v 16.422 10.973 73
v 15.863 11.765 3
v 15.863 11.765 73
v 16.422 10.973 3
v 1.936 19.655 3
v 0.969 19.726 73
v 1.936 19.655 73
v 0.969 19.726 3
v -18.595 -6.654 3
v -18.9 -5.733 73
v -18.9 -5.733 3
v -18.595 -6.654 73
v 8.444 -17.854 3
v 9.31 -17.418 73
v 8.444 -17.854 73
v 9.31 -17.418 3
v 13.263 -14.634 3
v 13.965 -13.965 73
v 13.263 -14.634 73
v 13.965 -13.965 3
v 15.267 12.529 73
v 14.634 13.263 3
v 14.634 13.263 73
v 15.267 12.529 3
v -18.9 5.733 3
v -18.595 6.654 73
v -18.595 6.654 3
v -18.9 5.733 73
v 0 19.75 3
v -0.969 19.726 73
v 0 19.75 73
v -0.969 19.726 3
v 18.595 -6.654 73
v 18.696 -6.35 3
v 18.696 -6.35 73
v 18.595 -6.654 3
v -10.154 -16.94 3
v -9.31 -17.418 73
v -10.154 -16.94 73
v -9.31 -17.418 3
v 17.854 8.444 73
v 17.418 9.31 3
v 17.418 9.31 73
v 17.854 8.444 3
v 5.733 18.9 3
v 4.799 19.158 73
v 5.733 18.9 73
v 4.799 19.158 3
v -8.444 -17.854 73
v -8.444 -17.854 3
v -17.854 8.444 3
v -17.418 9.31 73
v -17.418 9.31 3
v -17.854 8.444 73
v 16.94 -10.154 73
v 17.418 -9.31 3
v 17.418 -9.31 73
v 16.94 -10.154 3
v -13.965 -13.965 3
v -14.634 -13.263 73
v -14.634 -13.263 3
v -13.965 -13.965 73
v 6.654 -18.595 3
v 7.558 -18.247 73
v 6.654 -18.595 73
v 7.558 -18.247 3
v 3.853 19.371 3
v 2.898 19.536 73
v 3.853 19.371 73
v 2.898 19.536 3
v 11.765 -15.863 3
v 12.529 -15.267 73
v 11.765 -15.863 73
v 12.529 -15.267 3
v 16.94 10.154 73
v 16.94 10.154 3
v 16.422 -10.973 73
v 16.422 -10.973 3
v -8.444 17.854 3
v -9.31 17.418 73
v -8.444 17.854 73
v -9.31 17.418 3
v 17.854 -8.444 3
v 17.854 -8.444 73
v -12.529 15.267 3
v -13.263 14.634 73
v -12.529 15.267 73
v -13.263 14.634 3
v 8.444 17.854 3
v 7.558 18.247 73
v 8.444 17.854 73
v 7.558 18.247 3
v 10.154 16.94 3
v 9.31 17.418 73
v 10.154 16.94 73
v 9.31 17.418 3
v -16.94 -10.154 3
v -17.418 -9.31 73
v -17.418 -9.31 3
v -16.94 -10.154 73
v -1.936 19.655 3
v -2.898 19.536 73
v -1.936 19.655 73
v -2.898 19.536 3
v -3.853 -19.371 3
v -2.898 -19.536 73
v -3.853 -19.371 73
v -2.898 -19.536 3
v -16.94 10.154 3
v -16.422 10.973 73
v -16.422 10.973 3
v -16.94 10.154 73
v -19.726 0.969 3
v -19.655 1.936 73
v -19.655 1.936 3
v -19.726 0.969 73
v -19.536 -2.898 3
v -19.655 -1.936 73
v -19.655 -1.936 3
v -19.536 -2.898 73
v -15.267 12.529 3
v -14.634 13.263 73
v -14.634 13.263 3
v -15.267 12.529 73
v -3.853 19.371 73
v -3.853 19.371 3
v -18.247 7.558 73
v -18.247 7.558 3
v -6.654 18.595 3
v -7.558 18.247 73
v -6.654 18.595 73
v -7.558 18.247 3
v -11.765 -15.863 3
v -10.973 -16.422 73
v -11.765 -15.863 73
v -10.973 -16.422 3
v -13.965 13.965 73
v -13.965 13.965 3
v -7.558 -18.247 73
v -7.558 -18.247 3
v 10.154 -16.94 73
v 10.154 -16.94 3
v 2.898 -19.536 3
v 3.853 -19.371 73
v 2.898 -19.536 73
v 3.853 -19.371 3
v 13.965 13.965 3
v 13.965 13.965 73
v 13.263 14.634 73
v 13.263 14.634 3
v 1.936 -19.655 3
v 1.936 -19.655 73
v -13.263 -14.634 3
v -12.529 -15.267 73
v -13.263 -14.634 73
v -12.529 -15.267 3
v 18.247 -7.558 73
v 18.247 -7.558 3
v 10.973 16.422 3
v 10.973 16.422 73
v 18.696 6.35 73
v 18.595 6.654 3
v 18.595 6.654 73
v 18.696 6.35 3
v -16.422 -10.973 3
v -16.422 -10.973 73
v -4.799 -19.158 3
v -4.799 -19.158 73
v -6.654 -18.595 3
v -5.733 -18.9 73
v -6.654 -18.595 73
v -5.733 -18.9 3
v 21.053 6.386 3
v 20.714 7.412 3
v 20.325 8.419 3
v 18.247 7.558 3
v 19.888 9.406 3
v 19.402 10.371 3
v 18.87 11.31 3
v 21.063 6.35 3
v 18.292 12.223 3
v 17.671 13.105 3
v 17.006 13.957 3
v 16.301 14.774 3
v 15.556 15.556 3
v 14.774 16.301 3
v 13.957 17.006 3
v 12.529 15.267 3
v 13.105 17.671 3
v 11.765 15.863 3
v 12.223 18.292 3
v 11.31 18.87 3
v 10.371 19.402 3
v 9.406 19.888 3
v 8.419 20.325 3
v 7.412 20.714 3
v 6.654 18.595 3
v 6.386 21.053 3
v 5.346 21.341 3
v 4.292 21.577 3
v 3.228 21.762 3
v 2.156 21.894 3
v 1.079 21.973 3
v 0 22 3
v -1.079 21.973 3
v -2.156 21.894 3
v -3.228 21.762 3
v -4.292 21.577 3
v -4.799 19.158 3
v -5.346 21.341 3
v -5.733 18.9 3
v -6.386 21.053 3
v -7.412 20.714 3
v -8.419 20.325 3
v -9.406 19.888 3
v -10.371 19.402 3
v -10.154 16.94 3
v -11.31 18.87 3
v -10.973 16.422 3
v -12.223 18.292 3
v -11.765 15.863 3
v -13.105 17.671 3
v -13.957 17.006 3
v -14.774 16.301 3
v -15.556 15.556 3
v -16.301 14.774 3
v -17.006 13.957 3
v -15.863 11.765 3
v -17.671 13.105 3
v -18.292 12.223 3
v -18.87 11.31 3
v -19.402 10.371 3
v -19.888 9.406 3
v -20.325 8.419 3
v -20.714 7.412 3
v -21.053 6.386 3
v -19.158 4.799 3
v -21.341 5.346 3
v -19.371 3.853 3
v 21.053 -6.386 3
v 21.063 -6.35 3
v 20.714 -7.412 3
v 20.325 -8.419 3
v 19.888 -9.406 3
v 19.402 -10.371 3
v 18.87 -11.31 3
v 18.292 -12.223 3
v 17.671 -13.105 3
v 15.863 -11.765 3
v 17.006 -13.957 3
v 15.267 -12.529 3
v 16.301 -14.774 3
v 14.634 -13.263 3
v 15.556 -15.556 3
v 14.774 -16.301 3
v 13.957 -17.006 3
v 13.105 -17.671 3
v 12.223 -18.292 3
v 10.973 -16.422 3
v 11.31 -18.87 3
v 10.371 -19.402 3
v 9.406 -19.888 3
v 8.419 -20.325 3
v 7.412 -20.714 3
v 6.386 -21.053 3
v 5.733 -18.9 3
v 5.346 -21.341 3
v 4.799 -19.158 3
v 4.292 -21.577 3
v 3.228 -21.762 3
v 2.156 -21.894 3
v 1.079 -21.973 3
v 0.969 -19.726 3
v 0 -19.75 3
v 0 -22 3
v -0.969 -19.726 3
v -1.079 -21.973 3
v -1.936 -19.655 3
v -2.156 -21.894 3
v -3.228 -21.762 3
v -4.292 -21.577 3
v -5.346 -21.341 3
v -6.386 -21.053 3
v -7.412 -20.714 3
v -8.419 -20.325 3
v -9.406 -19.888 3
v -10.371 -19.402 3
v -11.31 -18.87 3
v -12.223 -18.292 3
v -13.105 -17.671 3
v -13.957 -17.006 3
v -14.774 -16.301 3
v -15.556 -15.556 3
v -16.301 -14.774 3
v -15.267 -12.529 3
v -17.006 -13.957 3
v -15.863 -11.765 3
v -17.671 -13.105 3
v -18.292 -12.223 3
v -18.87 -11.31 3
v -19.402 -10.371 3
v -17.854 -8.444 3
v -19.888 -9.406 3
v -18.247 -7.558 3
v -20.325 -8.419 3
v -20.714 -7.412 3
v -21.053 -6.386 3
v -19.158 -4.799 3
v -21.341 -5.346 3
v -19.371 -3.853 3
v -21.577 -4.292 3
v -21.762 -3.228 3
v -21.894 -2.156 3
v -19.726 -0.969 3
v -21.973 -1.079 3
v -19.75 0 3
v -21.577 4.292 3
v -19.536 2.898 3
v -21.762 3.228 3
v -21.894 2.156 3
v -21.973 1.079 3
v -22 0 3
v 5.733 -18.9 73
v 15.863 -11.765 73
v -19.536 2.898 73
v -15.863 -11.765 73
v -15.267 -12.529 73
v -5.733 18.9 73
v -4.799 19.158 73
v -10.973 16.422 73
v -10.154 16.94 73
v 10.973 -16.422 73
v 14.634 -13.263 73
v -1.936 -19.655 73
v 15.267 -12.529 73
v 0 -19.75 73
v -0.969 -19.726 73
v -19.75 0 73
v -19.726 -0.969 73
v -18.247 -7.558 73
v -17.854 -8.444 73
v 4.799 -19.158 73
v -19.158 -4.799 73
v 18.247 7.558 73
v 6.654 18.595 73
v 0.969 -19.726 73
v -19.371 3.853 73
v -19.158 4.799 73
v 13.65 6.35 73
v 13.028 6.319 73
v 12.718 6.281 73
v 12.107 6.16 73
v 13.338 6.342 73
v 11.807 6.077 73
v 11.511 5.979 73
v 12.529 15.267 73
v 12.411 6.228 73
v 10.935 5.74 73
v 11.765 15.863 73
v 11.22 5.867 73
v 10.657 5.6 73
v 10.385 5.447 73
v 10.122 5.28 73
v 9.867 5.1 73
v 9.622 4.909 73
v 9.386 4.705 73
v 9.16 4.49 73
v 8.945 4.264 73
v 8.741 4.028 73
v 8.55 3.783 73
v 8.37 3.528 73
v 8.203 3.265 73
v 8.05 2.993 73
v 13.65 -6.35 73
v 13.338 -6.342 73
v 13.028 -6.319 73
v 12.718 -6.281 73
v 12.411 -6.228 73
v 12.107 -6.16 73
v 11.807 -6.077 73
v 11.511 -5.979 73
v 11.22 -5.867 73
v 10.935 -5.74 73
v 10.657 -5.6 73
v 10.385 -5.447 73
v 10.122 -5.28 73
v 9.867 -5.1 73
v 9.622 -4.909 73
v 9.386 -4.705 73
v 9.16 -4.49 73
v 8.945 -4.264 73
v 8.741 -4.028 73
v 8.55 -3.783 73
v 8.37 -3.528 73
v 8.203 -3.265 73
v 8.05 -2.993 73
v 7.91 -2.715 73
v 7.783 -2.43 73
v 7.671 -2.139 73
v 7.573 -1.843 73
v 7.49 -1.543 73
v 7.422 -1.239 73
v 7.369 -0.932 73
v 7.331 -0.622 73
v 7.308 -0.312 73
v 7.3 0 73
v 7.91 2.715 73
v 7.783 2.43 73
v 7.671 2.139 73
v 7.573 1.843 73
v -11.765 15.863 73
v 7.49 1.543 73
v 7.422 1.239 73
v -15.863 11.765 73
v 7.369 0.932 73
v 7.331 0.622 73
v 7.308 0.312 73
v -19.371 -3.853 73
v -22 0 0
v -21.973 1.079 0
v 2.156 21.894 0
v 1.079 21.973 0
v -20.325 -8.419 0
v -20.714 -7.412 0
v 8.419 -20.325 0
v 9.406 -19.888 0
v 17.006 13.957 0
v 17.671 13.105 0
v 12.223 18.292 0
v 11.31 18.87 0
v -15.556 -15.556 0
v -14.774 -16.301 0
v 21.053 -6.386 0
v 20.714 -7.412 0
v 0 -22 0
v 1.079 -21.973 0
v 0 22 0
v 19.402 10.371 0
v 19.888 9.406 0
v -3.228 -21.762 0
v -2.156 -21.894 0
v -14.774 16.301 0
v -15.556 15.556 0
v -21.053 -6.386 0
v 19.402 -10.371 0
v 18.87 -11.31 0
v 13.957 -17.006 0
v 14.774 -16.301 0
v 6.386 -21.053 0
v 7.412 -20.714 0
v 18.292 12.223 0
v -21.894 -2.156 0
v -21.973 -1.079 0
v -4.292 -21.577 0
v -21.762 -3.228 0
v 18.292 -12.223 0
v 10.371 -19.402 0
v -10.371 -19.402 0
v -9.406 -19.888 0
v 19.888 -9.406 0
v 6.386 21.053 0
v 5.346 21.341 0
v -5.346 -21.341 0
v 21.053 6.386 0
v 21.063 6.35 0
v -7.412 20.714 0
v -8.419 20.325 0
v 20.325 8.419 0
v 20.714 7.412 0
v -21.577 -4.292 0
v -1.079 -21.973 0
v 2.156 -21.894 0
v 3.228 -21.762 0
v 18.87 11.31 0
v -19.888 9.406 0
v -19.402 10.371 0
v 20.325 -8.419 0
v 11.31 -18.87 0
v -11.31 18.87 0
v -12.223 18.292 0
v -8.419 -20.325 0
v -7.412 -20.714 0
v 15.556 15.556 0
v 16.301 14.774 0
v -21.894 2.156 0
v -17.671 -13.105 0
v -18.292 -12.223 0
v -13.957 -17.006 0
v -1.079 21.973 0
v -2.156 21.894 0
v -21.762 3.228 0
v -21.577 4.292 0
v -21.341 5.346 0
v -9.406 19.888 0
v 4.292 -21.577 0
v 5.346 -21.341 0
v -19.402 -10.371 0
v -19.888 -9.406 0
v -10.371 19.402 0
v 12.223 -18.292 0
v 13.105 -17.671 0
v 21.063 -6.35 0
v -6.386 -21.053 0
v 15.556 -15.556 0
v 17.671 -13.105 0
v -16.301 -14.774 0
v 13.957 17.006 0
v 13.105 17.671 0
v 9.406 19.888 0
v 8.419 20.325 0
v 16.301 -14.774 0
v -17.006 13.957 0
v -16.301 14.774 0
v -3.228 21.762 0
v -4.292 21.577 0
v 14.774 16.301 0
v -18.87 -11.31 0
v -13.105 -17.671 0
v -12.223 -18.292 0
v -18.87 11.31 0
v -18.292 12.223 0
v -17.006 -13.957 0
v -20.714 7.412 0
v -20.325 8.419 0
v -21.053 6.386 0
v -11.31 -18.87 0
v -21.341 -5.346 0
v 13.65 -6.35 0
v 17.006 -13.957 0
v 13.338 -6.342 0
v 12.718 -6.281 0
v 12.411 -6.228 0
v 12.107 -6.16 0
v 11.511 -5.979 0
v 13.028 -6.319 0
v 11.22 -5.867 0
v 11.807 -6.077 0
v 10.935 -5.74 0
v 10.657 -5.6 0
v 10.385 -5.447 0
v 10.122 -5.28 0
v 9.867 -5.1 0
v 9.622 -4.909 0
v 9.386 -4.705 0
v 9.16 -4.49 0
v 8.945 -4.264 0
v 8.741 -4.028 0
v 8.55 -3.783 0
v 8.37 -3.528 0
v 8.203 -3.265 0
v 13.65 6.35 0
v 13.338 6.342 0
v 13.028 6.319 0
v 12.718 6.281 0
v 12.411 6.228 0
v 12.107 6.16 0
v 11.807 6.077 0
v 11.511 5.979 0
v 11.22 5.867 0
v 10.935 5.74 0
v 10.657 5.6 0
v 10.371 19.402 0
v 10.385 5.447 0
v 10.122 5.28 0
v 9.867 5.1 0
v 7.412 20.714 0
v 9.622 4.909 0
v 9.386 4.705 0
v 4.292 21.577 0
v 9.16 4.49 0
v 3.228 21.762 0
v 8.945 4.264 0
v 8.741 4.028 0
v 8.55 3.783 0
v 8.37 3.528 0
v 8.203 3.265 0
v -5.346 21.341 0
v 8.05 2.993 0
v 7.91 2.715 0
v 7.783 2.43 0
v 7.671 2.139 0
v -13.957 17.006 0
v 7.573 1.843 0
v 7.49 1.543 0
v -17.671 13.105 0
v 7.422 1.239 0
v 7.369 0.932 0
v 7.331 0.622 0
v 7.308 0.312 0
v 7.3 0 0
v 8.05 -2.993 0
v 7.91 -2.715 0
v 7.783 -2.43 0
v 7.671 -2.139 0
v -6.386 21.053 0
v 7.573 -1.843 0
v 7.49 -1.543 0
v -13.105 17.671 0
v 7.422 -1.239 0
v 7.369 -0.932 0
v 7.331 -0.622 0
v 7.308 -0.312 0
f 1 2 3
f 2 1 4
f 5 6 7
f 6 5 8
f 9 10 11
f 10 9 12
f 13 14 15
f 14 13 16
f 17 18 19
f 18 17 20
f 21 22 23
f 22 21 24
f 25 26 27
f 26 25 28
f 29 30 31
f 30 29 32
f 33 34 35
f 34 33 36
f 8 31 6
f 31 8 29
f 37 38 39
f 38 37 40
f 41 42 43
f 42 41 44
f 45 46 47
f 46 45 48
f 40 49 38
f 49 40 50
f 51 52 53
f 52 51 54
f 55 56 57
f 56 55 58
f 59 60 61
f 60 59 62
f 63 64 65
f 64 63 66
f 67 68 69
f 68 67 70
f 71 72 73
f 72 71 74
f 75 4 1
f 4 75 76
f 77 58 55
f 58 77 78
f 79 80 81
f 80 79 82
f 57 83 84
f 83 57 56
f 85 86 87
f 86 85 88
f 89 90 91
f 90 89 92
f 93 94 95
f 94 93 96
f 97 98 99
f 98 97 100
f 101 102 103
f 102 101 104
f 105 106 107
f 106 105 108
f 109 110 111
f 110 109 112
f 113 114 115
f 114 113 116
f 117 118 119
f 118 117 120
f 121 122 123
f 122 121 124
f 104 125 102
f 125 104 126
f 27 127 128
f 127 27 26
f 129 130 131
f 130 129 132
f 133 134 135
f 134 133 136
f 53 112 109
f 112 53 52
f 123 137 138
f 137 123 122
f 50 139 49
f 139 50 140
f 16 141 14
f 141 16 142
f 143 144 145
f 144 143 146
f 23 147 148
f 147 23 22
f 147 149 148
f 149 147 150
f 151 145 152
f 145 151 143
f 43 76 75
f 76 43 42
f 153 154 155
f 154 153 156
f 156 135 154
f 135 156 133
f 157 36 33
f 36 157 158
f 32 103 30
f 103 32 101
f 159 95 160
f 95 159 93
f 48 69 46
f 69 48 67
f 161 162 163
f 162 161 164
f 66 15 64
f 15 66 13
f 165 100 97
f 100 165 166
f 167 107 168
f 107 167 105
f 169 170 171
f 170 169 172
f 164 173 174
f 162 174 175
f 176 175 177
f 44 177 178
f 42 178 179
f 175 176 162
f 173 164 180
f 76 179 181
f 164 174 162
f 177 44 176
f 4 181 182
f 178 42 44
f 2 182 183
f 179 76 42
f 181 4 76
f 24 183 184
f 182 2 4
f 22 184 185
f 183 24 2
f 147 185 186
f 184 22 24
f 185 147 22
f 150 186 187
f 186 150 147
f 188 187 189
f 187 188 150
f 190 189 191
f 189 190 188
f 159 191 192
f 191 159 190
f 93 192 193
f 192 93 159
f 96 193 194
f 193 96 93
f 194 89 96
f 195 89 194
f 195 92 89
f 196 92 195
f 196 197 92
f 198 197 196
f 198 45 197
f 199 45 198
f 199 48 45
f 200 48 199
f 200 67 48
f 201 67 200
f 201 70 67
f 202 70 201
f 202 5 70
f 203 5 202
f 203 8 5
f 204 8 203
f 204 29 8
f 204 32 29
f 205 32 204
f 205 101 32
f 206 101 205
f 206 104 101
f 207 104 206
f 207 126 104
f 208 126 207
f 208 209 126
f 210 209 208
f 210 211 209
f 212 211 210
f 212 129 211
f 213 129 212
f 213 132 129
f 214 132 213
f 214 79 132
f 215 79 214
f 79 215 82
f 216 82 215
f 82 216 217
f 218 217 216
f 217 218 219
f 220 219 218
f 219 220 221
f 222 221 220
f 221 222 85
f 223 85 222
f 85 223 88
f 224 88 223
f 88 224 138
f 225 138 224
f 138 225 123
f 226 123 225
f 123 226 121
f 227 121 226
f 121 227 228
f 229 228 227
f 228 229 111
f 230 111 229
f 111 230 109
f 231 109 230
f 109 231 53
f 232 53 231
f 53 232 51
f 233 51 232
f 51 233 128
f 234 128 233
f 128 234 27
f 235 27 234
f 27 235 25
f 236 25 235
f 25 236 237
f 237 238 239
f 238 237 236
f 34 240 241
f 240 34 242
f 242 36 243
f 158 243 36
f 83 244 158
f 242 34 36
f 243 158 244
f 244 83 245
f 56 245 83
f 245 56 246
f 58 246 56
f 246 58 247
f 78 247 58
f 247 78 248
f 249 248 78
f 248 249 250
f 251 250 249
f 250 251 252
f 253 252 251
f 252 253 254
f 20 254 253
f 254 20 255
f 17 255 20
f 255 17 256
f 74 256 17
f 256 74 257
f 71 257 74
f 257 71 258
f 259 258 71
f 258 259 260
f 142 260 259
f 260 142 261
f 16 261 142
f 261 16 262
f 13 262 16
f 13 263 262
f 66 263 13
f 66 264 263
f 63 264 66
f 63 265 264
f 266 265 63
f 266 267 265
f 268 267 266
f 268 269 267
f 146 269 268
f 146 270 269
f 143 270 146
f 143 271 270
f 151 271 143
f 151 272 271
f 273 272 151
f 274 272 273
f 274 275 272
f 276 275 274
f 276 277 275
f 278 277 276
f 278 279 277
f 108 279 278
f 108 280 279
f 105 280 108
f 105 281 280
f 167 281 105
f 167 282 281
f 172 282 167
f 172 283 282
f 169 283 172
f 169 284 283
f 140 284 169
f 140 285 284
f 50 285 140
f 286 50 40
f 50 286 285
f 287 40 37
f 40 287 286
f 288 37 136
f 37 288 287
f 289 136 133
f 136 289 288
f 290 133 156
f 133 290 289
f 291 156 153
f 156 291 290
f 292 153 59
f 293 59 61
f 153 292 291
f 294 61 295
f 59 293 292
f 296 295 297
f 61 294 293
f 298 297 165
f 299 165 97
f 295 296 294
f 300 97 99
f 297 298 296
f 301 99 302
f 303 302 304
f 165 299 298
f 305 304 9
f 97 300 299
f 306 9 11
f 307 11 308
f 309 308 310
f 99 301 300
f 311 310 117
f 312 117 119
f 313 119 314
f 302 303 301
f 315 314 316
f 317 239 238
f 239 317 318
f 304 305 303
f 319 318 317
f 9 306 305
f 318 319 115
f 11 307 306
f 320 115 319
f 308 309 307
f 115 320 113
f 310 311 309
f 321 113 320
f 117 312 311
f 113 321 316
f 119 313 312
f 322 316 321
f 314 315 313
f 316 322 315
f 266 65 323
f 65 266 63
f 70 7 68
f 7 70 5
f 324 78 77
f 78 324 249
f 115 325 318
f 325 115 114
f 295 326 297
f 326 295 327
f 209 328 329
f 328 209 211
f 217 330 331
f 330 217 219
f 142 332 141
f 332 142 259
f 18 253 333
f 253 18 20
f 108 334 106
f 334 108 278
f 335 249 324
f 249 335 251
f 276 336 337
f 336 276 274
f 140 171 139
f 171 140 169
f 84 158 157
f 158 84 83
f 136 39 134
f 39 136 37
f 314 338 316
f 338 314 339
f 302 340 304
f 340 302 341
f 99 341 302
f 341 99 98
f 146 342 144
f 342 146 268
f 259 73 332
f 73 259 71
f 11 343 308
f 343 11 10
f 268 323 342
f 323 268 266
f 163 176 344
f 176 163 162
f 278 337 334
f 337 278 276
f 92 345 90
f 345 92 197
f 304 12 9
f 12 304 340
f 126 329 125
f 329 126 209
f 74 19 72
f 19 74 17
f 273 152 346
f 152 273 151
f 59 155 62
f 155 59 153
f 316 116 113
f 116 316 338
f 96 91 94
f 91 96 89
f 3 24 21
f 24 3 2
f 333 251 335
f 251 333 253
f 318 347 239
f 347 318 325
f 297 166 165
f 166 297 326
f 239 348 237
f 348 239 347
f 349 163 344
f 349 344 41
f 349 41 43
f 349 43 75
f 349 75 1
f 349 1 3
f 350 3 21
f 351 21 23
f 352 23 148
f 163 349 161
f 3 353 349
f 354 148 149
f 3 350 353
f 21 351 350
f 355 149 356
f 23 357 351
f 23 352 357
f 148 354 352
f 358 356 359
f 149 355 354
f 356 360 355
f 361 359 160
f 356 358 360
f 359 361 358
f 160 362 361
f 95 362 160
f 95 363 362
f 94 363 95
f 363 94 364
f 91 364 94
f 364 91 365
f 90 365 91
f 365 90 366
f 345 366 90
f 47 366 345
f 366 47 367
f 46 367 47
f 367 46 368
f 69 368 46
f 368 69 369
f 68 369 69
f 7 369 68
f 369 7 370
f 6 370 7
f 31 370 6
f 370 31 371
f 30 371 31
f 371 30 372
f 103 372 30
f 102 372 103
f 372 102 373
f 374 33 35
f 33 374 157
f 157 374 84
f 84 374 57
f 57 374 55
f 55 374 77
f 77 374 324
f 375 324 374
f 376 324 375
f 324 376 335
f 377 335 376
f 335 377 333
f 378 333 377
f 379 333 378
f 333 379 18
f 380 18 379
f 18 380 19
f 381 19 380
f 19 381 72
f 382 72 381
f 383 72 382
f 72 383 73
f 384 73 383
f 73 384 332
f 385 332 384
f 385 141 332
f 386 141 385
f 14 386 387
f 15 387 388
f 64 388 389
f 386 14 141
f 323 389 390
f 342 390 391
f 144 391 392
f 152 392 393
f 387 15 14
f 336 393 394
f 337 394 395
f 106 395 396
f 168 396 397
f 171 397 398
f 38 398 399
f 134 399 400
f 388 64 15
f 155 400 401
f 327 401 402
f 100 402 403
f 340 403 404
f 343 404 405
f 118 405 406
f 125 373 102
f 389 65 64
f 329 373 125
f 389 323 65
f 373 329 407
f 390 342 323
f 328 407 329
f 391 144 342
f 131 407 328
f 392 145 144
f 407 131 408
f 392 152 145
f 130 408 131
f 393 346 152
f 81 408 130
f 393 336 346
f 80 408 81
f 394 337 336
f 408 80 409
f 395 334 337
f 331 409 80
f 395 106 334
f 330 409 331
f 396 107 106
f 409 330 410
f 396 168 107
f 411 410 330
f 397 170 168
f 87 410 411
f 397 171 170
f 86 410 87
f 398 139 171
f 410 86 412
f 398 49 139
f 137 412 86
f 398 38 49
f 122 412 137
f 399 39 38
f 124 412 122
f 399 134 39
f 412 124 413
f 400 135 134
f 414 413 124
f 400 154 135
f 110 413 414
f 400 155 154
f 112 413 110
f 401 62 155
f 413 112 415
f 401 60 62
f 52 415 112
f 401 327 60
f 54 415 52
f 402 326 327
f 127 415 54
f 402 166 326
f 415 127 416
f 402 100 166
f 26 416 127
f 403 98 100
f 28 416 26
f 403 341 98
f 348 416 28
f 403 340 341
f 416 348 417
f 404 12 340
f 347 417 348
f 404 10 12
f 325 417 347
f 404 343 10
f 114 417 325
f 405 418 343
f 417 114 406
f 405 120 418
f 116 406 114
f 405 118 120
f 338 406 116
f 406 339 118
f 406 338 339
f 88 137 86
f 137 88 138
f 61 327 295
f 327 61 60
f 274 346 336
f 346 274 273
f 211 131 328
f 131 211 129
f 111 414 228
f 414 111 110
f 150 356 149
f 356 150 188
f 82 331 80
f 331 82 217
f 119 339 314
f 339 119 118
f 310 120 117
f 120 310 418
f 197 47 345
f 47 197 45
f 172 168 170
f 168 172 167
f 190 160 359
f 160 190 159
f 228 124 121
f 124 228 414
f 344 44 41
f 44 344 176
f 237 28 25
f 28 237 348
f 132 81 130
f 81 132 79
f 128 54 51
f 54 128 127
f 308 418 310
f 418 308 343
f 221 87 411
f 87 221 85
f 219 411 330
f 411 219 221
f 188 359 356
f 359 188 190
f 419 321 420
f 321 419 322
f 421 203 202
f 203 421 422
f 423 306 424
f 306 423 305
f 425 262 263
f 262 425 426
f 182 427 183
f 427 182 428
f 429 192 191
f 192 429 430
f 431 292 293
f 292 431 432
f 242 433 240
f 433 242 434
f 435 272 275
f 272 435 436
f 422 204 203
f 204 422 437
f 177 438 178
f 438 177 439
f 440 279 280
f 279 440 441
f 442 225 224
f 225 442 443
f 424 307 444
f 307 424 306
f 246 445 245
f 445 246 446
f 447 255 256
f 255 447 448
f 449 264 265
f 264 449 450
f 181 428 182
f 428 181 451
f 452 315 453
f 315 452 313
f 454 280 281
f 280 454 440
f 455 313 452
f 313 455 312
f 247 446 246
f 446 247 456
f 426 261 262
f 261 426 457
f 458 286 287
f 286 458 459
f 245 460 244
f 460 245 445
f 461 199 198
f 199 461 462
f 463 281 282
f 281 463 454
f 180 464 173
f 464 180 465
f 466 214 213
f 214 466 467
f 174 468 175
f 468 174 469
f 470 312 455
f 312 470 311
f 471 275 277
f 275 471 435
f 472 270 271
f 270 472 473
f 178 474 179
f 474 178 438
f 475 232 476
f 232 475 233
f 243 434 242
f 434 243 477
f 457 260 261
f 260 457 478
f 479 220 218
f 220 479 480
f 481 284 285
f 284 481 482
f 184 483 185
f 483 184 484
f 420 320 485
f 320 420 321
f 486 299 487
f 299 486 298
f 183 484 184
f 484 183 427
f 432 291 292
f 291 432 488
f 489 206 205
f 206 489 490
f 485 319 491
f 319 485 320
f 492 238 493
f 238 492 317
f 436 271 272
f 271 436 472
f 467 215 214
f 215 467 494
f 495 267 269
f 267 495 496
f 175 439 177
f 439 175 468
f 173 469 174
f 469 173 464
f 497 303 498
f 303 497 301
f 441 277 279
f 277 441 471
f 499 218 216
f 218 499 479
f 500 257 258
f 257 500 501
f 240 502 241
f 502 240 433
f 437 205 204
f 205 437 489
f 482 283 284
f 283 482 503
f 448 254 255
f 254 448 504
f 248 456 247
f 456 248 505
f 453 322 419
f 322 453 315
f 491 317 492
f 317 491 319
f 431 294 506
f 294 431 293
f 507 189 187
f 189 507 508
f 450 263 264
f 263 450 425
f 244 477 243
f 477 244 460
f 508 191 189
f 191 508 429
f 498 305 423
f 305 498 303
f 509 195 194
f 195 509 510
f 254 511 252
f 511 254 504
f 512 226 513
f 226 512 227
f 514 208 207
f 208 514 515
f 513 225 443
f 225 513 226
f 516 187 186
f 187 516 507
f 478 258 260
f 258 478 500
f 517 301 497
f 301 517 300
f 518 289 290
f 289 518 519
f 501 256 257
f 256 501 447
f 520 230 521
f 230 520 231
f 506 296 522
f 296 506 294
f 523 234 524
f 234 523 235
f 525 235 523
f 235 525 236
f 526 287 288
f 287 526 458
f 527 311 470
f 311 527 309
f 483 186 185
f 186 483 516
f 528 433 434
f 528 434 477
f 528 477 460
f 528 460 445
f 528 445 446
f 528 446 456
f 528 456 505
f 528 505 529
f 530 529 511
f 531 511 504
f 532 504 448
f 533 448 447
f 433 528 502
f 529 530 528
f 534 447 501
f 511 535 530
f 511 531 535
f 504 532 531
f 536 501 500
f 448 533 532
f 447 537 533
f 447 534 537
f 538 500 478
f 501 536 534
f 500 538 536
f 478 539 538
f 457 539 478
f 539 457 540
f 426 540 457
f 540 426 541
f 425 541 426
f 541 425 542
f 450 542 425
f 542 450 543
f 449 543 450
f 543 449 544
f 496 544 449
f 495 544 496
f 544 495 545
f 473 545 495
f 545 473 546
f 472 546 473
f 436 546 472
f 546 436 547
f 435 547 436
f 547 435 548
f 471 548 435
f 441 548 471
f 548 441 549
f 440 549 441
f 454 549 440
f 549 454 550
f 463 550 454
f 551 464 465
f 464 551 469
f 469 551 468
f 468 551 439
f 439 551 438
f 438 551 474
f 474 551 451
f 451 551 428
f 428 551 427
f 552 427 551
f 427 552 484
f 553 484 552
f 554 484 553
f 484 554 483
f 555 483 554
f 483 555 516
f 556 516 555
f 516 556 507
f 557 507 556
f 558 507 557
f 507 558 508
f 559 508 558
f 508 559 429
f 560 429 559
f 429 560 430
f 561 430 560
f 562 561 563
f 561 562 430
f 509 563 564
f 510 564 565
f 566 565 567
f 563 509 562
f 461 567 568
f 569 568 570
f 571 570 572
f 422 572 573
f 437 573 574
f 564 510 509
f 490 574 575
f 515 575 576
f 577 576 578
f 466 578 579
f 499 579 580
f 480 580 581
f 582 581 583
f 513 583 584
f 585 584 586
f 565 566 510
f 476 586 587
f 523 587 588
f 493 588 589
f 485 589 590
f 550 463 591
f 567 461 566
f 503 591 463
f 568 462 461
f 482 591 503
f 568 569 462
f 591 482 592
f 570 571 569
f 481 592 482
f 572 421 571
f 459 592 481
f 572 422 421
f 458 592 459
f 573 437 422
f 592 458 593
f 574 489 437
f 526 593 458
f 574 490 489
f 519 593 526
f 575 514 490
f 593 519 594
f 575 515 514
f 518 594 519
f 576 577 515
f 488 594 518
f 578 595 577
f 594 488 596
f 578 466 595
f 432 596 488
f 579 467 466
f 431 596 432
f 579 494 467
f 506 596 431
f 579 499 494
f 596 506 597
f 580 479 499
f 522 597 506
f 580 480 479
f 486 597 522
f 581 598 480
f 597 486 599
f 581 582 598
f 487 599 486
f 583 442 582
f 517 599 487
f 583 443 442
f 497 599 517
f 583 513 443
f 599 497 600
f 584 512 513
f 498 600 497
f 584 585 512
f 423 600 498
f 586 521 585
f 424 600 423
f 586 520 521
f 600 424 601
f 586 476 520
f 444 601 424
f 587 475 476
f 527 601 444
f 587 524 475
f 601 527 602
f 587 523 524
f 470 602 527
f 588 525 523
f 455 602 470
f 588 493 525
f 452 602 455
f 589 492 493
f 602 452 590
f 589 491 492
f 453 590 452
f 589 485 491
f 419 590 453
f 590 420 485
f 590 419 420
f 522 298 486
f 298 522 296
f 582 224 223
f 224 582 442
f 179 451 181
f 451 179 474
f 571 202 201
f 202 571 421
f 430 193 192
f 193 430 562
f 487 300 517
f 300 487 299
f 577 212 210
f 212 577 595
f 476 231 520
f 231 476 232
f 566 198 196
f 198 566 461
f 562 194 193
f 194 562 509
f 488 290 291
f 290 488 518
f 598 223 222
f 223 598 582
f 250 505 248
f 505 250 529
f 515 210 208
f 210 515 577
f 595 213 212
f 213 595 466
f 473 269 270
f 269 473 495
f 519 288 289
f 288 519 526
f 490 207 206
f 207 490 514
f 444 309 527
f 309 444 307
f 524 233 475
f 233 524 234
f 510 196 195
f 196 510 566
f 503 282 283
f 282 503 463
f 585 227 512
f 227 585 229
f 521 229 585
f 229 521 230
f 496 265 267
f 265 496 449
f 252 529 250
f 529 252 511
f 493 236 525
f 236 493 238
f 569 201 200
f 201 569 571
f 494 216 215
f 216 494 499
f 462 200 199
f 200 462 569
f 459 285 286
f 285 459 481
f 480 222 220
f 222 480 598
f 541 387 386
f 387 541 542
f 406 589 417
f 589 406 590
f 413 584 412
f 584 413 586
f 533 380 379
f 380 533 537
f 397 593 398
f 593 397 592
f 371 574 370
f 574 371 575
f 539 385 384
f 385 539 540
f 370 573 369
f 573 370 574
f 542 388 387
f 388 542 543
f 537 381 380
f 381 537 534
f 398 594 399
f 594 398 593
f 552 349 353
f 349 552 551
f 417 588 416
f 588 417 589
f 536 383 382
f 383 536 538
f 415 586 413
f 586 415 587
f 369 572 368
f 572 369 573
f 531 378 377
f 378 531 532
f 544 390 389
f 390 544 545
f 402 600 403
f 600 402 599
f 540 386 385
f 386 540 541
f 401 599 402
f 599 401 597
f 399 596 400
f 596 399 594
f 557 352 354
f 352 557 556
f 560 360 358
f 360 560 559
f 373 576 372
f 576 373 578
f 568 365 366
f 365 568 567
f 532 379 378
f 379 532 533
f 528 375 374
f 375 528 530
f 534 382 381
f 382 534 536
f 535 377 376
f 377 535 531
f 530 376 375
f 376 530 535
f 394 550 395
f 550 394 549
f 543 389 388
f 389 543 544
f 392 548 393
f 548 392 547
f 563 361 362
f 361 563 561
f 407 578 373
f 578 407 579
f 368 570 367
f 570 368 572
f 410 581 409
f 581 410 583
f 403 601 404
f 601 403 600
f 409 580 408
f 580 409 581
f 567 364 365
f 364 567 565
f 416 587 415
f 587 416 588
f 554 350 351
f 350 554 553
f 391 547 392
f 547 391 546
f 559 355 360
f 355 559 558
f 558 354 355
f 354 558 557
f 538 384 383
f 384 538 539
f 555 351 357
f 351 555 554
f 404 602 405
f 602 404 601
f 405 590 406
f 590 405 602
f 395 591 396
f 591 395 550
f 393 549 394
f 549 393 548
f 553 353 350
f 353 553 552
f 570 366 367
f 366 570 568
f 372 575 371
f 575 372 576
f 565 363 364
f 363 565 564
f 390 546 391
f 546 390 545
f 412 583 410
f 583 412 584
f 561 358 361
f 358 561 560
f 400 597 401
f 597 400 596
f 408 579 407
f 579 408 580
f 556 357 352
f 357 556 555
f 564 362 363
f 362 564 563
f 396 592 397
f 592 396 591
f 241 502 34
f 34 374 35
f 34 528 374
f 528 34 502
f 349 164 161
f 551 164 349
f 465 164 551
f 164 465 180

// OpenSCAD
// file: modules/utils.scad
////////////////////////////////////////////////////////////////////////////////////////////////////////////////////////

BUILD_PLATE_X = 256.0;
BUILD_PLATE_Y = 256.0;
BUILD_PLATE_Z = 256.0;

BUILD_PREVIEW_WIDTH = 0.01;

DIFFERENCE_CLEARANCE = 0.01;

////////////////////////////////////////////////////////////////////////////////////////////////////////////////////////
// show a preview of the build plate

module BuildPlatePreview()
{
    % translate([ 0, 0, -BUILD_PREVIEW_WIDTH ])
        cube([ BUILD_PLATE_X, BUILD_PLATE_Y, BUILD_PREVIEW_WIDTH ]);
}

////////////////////////////////////////////////////////////////////////////////////////////////////////////////////////
// list, sum and spacing functions

function reverse( list ) = [ for( i = [ len( list ) - 1 : -1 : 0 ] ) list[ i ] ];

// sum up the values in the given list
function sumList( list ) = _sumListHelper( list, 0 );
function _sumListHelper( list, n ) = n >= len( list ) ? 0 : list[ n ] + _sumListHelper( list, n + 1 );

// sum up the values in the given list from indicies 0..i (inclusive)
function sumTo( list, i ) = _sumToHelper( list, i, 0 );
function _sumToHelper( list, i, n ) = n >= i || n >= len( list ) ? 0 : list[ n ] + _sumToHelper( list, i, n + 1 );

function getListAtIndex( list, i ) = [ for ( entry = list ) entry[ i ] ];

// adds val_to_add to each index of the given list, returning a new list
function addValueToEachIndex( list, val_to_add ) = [ for( entry = list ) entry + val_to_add ];

// for each size in list, adds up the size and the equally spaces them in the total_size with the given clearance factored in
function calculateEquallySpacedOffset( list, total_size, clearance, i ) =
    let( sizes_with_clearance = addValueToEachIndex( list, clearance * 2 ) )
    let( spacing = ( total_size - sumList( sizes_with_clearance ) ) / ( len( list ) + 1 ) )
    spacing * ( i + 1 ) + sumTo( sizes_with_clearance, i );

// function calculateEquallySpacedOffset( total_size, count, i, item_size ) = ( i + 1 ) / ( count + 1 ) * total_size - item_size / 2;

function calculateOffsetToCenter( total_size, item_size ) = total_size / 2 - item_size / 2;

////////////////////////////////////////////////////////////////////////////////////////////////////////////////////////
// rotate so that we can draw an object from one point to the next

module RotateFromPointAtoB( a, b )
{
    // from: https://en.wikibooks.org/wiki/OpenSCAD_User_Manual/Transformations

    x = b[ 0 ] - a[ 0 ];
    y = b[ 1 ] - a[ 1 ];
    z = b[ 2 ] - a[ 2 ];

    length = norm([ x, y, z ]);
    b = acos( z / length );
    c = atan2( y, x );

    rotate([ 0, b, c ])
        children();
}

////////////////////////////////////////////////////////////////////////////////////////////////////////////////////////

module OptionalColor( color = false )
{
    if( color )
    {
        color( color )
            children();
    }
    else
    {
        children();
    }
}

////////////////////////////////////////////////////////////////////////////////////////////////////////////////////////
// main file
include <modules/utils.scad>

////////////////////////////////////////////////////////////////////////////////////////////////////////////////////////
// measurements

bird_feeder_pole_r = 12.2 / 2;
outer_r = 40.0 / 2;

top_extra_r = 2.0;

////////////////////////////////////////////////////////////////////////////////////////////////////////////////////////
// settings

// render_mode = "preview";
render_mode = "print";

clearance = 0.25;

body_z = 70;
top_z = 3.0;

////////////////////////////////////////////////////////////////////////////////////////////////////////////////////////
// calculations

$fn = $preview ? 32 : 128;

////////////////////////////////////////////////////////////////////////////////////////////////////////////////////////
// models

if( render_mode == "preview" )
{
    BirdfeederPoleAdapter();
}
else if( render_mode == "print" )
{
    translate([ 0, 0, body_z + top_z ])
        rotate([ 180, 0, 0 ])
            BirdfeederPoleAdapter();
}
else
{
    assert( false, str( "Unknown render mode: ", render_mode ) );
}

////////////////////////////////////////////////////////////////////////////////////////////////////////////////////////

module BirdfeederPoleAdapter()
{
    cutout_r = bird_feeder_pole_r + clearance;

    difference()
    {
        union()
        {
            cylinder(
                r = outer_r - clearance,
                h = body_z
                );

            translate([ 0, 0, body_z ])
                cylinder(
                    r = outer_r + top_extra_r,
                    h = top_z
                    );
        }

        translate([
            outer_r - bird_feeder_pole_r - clearance,
            0,
            -DIFFERENCE_CLEARANCE
            ])
            cylinder(
                r = cutout_r,
                h = body_z + top_z + DIFFERENCE_CLEARANCE * 2
                );

        translate([
            outer_r - bird_feeder_pole_r - clearance,
            -cutout_r,
            -DIFFERENCE_CLEARANCE
            ])
            cube([
                cutout_r * 2,
                cutout_r * 2,
                body_z + top_z + DIFFERENCE_CLEARANCE * 2
                ]);
    }
}

////////////////////////////////////////////////////////////////////////////////////////////////////////////////////////
